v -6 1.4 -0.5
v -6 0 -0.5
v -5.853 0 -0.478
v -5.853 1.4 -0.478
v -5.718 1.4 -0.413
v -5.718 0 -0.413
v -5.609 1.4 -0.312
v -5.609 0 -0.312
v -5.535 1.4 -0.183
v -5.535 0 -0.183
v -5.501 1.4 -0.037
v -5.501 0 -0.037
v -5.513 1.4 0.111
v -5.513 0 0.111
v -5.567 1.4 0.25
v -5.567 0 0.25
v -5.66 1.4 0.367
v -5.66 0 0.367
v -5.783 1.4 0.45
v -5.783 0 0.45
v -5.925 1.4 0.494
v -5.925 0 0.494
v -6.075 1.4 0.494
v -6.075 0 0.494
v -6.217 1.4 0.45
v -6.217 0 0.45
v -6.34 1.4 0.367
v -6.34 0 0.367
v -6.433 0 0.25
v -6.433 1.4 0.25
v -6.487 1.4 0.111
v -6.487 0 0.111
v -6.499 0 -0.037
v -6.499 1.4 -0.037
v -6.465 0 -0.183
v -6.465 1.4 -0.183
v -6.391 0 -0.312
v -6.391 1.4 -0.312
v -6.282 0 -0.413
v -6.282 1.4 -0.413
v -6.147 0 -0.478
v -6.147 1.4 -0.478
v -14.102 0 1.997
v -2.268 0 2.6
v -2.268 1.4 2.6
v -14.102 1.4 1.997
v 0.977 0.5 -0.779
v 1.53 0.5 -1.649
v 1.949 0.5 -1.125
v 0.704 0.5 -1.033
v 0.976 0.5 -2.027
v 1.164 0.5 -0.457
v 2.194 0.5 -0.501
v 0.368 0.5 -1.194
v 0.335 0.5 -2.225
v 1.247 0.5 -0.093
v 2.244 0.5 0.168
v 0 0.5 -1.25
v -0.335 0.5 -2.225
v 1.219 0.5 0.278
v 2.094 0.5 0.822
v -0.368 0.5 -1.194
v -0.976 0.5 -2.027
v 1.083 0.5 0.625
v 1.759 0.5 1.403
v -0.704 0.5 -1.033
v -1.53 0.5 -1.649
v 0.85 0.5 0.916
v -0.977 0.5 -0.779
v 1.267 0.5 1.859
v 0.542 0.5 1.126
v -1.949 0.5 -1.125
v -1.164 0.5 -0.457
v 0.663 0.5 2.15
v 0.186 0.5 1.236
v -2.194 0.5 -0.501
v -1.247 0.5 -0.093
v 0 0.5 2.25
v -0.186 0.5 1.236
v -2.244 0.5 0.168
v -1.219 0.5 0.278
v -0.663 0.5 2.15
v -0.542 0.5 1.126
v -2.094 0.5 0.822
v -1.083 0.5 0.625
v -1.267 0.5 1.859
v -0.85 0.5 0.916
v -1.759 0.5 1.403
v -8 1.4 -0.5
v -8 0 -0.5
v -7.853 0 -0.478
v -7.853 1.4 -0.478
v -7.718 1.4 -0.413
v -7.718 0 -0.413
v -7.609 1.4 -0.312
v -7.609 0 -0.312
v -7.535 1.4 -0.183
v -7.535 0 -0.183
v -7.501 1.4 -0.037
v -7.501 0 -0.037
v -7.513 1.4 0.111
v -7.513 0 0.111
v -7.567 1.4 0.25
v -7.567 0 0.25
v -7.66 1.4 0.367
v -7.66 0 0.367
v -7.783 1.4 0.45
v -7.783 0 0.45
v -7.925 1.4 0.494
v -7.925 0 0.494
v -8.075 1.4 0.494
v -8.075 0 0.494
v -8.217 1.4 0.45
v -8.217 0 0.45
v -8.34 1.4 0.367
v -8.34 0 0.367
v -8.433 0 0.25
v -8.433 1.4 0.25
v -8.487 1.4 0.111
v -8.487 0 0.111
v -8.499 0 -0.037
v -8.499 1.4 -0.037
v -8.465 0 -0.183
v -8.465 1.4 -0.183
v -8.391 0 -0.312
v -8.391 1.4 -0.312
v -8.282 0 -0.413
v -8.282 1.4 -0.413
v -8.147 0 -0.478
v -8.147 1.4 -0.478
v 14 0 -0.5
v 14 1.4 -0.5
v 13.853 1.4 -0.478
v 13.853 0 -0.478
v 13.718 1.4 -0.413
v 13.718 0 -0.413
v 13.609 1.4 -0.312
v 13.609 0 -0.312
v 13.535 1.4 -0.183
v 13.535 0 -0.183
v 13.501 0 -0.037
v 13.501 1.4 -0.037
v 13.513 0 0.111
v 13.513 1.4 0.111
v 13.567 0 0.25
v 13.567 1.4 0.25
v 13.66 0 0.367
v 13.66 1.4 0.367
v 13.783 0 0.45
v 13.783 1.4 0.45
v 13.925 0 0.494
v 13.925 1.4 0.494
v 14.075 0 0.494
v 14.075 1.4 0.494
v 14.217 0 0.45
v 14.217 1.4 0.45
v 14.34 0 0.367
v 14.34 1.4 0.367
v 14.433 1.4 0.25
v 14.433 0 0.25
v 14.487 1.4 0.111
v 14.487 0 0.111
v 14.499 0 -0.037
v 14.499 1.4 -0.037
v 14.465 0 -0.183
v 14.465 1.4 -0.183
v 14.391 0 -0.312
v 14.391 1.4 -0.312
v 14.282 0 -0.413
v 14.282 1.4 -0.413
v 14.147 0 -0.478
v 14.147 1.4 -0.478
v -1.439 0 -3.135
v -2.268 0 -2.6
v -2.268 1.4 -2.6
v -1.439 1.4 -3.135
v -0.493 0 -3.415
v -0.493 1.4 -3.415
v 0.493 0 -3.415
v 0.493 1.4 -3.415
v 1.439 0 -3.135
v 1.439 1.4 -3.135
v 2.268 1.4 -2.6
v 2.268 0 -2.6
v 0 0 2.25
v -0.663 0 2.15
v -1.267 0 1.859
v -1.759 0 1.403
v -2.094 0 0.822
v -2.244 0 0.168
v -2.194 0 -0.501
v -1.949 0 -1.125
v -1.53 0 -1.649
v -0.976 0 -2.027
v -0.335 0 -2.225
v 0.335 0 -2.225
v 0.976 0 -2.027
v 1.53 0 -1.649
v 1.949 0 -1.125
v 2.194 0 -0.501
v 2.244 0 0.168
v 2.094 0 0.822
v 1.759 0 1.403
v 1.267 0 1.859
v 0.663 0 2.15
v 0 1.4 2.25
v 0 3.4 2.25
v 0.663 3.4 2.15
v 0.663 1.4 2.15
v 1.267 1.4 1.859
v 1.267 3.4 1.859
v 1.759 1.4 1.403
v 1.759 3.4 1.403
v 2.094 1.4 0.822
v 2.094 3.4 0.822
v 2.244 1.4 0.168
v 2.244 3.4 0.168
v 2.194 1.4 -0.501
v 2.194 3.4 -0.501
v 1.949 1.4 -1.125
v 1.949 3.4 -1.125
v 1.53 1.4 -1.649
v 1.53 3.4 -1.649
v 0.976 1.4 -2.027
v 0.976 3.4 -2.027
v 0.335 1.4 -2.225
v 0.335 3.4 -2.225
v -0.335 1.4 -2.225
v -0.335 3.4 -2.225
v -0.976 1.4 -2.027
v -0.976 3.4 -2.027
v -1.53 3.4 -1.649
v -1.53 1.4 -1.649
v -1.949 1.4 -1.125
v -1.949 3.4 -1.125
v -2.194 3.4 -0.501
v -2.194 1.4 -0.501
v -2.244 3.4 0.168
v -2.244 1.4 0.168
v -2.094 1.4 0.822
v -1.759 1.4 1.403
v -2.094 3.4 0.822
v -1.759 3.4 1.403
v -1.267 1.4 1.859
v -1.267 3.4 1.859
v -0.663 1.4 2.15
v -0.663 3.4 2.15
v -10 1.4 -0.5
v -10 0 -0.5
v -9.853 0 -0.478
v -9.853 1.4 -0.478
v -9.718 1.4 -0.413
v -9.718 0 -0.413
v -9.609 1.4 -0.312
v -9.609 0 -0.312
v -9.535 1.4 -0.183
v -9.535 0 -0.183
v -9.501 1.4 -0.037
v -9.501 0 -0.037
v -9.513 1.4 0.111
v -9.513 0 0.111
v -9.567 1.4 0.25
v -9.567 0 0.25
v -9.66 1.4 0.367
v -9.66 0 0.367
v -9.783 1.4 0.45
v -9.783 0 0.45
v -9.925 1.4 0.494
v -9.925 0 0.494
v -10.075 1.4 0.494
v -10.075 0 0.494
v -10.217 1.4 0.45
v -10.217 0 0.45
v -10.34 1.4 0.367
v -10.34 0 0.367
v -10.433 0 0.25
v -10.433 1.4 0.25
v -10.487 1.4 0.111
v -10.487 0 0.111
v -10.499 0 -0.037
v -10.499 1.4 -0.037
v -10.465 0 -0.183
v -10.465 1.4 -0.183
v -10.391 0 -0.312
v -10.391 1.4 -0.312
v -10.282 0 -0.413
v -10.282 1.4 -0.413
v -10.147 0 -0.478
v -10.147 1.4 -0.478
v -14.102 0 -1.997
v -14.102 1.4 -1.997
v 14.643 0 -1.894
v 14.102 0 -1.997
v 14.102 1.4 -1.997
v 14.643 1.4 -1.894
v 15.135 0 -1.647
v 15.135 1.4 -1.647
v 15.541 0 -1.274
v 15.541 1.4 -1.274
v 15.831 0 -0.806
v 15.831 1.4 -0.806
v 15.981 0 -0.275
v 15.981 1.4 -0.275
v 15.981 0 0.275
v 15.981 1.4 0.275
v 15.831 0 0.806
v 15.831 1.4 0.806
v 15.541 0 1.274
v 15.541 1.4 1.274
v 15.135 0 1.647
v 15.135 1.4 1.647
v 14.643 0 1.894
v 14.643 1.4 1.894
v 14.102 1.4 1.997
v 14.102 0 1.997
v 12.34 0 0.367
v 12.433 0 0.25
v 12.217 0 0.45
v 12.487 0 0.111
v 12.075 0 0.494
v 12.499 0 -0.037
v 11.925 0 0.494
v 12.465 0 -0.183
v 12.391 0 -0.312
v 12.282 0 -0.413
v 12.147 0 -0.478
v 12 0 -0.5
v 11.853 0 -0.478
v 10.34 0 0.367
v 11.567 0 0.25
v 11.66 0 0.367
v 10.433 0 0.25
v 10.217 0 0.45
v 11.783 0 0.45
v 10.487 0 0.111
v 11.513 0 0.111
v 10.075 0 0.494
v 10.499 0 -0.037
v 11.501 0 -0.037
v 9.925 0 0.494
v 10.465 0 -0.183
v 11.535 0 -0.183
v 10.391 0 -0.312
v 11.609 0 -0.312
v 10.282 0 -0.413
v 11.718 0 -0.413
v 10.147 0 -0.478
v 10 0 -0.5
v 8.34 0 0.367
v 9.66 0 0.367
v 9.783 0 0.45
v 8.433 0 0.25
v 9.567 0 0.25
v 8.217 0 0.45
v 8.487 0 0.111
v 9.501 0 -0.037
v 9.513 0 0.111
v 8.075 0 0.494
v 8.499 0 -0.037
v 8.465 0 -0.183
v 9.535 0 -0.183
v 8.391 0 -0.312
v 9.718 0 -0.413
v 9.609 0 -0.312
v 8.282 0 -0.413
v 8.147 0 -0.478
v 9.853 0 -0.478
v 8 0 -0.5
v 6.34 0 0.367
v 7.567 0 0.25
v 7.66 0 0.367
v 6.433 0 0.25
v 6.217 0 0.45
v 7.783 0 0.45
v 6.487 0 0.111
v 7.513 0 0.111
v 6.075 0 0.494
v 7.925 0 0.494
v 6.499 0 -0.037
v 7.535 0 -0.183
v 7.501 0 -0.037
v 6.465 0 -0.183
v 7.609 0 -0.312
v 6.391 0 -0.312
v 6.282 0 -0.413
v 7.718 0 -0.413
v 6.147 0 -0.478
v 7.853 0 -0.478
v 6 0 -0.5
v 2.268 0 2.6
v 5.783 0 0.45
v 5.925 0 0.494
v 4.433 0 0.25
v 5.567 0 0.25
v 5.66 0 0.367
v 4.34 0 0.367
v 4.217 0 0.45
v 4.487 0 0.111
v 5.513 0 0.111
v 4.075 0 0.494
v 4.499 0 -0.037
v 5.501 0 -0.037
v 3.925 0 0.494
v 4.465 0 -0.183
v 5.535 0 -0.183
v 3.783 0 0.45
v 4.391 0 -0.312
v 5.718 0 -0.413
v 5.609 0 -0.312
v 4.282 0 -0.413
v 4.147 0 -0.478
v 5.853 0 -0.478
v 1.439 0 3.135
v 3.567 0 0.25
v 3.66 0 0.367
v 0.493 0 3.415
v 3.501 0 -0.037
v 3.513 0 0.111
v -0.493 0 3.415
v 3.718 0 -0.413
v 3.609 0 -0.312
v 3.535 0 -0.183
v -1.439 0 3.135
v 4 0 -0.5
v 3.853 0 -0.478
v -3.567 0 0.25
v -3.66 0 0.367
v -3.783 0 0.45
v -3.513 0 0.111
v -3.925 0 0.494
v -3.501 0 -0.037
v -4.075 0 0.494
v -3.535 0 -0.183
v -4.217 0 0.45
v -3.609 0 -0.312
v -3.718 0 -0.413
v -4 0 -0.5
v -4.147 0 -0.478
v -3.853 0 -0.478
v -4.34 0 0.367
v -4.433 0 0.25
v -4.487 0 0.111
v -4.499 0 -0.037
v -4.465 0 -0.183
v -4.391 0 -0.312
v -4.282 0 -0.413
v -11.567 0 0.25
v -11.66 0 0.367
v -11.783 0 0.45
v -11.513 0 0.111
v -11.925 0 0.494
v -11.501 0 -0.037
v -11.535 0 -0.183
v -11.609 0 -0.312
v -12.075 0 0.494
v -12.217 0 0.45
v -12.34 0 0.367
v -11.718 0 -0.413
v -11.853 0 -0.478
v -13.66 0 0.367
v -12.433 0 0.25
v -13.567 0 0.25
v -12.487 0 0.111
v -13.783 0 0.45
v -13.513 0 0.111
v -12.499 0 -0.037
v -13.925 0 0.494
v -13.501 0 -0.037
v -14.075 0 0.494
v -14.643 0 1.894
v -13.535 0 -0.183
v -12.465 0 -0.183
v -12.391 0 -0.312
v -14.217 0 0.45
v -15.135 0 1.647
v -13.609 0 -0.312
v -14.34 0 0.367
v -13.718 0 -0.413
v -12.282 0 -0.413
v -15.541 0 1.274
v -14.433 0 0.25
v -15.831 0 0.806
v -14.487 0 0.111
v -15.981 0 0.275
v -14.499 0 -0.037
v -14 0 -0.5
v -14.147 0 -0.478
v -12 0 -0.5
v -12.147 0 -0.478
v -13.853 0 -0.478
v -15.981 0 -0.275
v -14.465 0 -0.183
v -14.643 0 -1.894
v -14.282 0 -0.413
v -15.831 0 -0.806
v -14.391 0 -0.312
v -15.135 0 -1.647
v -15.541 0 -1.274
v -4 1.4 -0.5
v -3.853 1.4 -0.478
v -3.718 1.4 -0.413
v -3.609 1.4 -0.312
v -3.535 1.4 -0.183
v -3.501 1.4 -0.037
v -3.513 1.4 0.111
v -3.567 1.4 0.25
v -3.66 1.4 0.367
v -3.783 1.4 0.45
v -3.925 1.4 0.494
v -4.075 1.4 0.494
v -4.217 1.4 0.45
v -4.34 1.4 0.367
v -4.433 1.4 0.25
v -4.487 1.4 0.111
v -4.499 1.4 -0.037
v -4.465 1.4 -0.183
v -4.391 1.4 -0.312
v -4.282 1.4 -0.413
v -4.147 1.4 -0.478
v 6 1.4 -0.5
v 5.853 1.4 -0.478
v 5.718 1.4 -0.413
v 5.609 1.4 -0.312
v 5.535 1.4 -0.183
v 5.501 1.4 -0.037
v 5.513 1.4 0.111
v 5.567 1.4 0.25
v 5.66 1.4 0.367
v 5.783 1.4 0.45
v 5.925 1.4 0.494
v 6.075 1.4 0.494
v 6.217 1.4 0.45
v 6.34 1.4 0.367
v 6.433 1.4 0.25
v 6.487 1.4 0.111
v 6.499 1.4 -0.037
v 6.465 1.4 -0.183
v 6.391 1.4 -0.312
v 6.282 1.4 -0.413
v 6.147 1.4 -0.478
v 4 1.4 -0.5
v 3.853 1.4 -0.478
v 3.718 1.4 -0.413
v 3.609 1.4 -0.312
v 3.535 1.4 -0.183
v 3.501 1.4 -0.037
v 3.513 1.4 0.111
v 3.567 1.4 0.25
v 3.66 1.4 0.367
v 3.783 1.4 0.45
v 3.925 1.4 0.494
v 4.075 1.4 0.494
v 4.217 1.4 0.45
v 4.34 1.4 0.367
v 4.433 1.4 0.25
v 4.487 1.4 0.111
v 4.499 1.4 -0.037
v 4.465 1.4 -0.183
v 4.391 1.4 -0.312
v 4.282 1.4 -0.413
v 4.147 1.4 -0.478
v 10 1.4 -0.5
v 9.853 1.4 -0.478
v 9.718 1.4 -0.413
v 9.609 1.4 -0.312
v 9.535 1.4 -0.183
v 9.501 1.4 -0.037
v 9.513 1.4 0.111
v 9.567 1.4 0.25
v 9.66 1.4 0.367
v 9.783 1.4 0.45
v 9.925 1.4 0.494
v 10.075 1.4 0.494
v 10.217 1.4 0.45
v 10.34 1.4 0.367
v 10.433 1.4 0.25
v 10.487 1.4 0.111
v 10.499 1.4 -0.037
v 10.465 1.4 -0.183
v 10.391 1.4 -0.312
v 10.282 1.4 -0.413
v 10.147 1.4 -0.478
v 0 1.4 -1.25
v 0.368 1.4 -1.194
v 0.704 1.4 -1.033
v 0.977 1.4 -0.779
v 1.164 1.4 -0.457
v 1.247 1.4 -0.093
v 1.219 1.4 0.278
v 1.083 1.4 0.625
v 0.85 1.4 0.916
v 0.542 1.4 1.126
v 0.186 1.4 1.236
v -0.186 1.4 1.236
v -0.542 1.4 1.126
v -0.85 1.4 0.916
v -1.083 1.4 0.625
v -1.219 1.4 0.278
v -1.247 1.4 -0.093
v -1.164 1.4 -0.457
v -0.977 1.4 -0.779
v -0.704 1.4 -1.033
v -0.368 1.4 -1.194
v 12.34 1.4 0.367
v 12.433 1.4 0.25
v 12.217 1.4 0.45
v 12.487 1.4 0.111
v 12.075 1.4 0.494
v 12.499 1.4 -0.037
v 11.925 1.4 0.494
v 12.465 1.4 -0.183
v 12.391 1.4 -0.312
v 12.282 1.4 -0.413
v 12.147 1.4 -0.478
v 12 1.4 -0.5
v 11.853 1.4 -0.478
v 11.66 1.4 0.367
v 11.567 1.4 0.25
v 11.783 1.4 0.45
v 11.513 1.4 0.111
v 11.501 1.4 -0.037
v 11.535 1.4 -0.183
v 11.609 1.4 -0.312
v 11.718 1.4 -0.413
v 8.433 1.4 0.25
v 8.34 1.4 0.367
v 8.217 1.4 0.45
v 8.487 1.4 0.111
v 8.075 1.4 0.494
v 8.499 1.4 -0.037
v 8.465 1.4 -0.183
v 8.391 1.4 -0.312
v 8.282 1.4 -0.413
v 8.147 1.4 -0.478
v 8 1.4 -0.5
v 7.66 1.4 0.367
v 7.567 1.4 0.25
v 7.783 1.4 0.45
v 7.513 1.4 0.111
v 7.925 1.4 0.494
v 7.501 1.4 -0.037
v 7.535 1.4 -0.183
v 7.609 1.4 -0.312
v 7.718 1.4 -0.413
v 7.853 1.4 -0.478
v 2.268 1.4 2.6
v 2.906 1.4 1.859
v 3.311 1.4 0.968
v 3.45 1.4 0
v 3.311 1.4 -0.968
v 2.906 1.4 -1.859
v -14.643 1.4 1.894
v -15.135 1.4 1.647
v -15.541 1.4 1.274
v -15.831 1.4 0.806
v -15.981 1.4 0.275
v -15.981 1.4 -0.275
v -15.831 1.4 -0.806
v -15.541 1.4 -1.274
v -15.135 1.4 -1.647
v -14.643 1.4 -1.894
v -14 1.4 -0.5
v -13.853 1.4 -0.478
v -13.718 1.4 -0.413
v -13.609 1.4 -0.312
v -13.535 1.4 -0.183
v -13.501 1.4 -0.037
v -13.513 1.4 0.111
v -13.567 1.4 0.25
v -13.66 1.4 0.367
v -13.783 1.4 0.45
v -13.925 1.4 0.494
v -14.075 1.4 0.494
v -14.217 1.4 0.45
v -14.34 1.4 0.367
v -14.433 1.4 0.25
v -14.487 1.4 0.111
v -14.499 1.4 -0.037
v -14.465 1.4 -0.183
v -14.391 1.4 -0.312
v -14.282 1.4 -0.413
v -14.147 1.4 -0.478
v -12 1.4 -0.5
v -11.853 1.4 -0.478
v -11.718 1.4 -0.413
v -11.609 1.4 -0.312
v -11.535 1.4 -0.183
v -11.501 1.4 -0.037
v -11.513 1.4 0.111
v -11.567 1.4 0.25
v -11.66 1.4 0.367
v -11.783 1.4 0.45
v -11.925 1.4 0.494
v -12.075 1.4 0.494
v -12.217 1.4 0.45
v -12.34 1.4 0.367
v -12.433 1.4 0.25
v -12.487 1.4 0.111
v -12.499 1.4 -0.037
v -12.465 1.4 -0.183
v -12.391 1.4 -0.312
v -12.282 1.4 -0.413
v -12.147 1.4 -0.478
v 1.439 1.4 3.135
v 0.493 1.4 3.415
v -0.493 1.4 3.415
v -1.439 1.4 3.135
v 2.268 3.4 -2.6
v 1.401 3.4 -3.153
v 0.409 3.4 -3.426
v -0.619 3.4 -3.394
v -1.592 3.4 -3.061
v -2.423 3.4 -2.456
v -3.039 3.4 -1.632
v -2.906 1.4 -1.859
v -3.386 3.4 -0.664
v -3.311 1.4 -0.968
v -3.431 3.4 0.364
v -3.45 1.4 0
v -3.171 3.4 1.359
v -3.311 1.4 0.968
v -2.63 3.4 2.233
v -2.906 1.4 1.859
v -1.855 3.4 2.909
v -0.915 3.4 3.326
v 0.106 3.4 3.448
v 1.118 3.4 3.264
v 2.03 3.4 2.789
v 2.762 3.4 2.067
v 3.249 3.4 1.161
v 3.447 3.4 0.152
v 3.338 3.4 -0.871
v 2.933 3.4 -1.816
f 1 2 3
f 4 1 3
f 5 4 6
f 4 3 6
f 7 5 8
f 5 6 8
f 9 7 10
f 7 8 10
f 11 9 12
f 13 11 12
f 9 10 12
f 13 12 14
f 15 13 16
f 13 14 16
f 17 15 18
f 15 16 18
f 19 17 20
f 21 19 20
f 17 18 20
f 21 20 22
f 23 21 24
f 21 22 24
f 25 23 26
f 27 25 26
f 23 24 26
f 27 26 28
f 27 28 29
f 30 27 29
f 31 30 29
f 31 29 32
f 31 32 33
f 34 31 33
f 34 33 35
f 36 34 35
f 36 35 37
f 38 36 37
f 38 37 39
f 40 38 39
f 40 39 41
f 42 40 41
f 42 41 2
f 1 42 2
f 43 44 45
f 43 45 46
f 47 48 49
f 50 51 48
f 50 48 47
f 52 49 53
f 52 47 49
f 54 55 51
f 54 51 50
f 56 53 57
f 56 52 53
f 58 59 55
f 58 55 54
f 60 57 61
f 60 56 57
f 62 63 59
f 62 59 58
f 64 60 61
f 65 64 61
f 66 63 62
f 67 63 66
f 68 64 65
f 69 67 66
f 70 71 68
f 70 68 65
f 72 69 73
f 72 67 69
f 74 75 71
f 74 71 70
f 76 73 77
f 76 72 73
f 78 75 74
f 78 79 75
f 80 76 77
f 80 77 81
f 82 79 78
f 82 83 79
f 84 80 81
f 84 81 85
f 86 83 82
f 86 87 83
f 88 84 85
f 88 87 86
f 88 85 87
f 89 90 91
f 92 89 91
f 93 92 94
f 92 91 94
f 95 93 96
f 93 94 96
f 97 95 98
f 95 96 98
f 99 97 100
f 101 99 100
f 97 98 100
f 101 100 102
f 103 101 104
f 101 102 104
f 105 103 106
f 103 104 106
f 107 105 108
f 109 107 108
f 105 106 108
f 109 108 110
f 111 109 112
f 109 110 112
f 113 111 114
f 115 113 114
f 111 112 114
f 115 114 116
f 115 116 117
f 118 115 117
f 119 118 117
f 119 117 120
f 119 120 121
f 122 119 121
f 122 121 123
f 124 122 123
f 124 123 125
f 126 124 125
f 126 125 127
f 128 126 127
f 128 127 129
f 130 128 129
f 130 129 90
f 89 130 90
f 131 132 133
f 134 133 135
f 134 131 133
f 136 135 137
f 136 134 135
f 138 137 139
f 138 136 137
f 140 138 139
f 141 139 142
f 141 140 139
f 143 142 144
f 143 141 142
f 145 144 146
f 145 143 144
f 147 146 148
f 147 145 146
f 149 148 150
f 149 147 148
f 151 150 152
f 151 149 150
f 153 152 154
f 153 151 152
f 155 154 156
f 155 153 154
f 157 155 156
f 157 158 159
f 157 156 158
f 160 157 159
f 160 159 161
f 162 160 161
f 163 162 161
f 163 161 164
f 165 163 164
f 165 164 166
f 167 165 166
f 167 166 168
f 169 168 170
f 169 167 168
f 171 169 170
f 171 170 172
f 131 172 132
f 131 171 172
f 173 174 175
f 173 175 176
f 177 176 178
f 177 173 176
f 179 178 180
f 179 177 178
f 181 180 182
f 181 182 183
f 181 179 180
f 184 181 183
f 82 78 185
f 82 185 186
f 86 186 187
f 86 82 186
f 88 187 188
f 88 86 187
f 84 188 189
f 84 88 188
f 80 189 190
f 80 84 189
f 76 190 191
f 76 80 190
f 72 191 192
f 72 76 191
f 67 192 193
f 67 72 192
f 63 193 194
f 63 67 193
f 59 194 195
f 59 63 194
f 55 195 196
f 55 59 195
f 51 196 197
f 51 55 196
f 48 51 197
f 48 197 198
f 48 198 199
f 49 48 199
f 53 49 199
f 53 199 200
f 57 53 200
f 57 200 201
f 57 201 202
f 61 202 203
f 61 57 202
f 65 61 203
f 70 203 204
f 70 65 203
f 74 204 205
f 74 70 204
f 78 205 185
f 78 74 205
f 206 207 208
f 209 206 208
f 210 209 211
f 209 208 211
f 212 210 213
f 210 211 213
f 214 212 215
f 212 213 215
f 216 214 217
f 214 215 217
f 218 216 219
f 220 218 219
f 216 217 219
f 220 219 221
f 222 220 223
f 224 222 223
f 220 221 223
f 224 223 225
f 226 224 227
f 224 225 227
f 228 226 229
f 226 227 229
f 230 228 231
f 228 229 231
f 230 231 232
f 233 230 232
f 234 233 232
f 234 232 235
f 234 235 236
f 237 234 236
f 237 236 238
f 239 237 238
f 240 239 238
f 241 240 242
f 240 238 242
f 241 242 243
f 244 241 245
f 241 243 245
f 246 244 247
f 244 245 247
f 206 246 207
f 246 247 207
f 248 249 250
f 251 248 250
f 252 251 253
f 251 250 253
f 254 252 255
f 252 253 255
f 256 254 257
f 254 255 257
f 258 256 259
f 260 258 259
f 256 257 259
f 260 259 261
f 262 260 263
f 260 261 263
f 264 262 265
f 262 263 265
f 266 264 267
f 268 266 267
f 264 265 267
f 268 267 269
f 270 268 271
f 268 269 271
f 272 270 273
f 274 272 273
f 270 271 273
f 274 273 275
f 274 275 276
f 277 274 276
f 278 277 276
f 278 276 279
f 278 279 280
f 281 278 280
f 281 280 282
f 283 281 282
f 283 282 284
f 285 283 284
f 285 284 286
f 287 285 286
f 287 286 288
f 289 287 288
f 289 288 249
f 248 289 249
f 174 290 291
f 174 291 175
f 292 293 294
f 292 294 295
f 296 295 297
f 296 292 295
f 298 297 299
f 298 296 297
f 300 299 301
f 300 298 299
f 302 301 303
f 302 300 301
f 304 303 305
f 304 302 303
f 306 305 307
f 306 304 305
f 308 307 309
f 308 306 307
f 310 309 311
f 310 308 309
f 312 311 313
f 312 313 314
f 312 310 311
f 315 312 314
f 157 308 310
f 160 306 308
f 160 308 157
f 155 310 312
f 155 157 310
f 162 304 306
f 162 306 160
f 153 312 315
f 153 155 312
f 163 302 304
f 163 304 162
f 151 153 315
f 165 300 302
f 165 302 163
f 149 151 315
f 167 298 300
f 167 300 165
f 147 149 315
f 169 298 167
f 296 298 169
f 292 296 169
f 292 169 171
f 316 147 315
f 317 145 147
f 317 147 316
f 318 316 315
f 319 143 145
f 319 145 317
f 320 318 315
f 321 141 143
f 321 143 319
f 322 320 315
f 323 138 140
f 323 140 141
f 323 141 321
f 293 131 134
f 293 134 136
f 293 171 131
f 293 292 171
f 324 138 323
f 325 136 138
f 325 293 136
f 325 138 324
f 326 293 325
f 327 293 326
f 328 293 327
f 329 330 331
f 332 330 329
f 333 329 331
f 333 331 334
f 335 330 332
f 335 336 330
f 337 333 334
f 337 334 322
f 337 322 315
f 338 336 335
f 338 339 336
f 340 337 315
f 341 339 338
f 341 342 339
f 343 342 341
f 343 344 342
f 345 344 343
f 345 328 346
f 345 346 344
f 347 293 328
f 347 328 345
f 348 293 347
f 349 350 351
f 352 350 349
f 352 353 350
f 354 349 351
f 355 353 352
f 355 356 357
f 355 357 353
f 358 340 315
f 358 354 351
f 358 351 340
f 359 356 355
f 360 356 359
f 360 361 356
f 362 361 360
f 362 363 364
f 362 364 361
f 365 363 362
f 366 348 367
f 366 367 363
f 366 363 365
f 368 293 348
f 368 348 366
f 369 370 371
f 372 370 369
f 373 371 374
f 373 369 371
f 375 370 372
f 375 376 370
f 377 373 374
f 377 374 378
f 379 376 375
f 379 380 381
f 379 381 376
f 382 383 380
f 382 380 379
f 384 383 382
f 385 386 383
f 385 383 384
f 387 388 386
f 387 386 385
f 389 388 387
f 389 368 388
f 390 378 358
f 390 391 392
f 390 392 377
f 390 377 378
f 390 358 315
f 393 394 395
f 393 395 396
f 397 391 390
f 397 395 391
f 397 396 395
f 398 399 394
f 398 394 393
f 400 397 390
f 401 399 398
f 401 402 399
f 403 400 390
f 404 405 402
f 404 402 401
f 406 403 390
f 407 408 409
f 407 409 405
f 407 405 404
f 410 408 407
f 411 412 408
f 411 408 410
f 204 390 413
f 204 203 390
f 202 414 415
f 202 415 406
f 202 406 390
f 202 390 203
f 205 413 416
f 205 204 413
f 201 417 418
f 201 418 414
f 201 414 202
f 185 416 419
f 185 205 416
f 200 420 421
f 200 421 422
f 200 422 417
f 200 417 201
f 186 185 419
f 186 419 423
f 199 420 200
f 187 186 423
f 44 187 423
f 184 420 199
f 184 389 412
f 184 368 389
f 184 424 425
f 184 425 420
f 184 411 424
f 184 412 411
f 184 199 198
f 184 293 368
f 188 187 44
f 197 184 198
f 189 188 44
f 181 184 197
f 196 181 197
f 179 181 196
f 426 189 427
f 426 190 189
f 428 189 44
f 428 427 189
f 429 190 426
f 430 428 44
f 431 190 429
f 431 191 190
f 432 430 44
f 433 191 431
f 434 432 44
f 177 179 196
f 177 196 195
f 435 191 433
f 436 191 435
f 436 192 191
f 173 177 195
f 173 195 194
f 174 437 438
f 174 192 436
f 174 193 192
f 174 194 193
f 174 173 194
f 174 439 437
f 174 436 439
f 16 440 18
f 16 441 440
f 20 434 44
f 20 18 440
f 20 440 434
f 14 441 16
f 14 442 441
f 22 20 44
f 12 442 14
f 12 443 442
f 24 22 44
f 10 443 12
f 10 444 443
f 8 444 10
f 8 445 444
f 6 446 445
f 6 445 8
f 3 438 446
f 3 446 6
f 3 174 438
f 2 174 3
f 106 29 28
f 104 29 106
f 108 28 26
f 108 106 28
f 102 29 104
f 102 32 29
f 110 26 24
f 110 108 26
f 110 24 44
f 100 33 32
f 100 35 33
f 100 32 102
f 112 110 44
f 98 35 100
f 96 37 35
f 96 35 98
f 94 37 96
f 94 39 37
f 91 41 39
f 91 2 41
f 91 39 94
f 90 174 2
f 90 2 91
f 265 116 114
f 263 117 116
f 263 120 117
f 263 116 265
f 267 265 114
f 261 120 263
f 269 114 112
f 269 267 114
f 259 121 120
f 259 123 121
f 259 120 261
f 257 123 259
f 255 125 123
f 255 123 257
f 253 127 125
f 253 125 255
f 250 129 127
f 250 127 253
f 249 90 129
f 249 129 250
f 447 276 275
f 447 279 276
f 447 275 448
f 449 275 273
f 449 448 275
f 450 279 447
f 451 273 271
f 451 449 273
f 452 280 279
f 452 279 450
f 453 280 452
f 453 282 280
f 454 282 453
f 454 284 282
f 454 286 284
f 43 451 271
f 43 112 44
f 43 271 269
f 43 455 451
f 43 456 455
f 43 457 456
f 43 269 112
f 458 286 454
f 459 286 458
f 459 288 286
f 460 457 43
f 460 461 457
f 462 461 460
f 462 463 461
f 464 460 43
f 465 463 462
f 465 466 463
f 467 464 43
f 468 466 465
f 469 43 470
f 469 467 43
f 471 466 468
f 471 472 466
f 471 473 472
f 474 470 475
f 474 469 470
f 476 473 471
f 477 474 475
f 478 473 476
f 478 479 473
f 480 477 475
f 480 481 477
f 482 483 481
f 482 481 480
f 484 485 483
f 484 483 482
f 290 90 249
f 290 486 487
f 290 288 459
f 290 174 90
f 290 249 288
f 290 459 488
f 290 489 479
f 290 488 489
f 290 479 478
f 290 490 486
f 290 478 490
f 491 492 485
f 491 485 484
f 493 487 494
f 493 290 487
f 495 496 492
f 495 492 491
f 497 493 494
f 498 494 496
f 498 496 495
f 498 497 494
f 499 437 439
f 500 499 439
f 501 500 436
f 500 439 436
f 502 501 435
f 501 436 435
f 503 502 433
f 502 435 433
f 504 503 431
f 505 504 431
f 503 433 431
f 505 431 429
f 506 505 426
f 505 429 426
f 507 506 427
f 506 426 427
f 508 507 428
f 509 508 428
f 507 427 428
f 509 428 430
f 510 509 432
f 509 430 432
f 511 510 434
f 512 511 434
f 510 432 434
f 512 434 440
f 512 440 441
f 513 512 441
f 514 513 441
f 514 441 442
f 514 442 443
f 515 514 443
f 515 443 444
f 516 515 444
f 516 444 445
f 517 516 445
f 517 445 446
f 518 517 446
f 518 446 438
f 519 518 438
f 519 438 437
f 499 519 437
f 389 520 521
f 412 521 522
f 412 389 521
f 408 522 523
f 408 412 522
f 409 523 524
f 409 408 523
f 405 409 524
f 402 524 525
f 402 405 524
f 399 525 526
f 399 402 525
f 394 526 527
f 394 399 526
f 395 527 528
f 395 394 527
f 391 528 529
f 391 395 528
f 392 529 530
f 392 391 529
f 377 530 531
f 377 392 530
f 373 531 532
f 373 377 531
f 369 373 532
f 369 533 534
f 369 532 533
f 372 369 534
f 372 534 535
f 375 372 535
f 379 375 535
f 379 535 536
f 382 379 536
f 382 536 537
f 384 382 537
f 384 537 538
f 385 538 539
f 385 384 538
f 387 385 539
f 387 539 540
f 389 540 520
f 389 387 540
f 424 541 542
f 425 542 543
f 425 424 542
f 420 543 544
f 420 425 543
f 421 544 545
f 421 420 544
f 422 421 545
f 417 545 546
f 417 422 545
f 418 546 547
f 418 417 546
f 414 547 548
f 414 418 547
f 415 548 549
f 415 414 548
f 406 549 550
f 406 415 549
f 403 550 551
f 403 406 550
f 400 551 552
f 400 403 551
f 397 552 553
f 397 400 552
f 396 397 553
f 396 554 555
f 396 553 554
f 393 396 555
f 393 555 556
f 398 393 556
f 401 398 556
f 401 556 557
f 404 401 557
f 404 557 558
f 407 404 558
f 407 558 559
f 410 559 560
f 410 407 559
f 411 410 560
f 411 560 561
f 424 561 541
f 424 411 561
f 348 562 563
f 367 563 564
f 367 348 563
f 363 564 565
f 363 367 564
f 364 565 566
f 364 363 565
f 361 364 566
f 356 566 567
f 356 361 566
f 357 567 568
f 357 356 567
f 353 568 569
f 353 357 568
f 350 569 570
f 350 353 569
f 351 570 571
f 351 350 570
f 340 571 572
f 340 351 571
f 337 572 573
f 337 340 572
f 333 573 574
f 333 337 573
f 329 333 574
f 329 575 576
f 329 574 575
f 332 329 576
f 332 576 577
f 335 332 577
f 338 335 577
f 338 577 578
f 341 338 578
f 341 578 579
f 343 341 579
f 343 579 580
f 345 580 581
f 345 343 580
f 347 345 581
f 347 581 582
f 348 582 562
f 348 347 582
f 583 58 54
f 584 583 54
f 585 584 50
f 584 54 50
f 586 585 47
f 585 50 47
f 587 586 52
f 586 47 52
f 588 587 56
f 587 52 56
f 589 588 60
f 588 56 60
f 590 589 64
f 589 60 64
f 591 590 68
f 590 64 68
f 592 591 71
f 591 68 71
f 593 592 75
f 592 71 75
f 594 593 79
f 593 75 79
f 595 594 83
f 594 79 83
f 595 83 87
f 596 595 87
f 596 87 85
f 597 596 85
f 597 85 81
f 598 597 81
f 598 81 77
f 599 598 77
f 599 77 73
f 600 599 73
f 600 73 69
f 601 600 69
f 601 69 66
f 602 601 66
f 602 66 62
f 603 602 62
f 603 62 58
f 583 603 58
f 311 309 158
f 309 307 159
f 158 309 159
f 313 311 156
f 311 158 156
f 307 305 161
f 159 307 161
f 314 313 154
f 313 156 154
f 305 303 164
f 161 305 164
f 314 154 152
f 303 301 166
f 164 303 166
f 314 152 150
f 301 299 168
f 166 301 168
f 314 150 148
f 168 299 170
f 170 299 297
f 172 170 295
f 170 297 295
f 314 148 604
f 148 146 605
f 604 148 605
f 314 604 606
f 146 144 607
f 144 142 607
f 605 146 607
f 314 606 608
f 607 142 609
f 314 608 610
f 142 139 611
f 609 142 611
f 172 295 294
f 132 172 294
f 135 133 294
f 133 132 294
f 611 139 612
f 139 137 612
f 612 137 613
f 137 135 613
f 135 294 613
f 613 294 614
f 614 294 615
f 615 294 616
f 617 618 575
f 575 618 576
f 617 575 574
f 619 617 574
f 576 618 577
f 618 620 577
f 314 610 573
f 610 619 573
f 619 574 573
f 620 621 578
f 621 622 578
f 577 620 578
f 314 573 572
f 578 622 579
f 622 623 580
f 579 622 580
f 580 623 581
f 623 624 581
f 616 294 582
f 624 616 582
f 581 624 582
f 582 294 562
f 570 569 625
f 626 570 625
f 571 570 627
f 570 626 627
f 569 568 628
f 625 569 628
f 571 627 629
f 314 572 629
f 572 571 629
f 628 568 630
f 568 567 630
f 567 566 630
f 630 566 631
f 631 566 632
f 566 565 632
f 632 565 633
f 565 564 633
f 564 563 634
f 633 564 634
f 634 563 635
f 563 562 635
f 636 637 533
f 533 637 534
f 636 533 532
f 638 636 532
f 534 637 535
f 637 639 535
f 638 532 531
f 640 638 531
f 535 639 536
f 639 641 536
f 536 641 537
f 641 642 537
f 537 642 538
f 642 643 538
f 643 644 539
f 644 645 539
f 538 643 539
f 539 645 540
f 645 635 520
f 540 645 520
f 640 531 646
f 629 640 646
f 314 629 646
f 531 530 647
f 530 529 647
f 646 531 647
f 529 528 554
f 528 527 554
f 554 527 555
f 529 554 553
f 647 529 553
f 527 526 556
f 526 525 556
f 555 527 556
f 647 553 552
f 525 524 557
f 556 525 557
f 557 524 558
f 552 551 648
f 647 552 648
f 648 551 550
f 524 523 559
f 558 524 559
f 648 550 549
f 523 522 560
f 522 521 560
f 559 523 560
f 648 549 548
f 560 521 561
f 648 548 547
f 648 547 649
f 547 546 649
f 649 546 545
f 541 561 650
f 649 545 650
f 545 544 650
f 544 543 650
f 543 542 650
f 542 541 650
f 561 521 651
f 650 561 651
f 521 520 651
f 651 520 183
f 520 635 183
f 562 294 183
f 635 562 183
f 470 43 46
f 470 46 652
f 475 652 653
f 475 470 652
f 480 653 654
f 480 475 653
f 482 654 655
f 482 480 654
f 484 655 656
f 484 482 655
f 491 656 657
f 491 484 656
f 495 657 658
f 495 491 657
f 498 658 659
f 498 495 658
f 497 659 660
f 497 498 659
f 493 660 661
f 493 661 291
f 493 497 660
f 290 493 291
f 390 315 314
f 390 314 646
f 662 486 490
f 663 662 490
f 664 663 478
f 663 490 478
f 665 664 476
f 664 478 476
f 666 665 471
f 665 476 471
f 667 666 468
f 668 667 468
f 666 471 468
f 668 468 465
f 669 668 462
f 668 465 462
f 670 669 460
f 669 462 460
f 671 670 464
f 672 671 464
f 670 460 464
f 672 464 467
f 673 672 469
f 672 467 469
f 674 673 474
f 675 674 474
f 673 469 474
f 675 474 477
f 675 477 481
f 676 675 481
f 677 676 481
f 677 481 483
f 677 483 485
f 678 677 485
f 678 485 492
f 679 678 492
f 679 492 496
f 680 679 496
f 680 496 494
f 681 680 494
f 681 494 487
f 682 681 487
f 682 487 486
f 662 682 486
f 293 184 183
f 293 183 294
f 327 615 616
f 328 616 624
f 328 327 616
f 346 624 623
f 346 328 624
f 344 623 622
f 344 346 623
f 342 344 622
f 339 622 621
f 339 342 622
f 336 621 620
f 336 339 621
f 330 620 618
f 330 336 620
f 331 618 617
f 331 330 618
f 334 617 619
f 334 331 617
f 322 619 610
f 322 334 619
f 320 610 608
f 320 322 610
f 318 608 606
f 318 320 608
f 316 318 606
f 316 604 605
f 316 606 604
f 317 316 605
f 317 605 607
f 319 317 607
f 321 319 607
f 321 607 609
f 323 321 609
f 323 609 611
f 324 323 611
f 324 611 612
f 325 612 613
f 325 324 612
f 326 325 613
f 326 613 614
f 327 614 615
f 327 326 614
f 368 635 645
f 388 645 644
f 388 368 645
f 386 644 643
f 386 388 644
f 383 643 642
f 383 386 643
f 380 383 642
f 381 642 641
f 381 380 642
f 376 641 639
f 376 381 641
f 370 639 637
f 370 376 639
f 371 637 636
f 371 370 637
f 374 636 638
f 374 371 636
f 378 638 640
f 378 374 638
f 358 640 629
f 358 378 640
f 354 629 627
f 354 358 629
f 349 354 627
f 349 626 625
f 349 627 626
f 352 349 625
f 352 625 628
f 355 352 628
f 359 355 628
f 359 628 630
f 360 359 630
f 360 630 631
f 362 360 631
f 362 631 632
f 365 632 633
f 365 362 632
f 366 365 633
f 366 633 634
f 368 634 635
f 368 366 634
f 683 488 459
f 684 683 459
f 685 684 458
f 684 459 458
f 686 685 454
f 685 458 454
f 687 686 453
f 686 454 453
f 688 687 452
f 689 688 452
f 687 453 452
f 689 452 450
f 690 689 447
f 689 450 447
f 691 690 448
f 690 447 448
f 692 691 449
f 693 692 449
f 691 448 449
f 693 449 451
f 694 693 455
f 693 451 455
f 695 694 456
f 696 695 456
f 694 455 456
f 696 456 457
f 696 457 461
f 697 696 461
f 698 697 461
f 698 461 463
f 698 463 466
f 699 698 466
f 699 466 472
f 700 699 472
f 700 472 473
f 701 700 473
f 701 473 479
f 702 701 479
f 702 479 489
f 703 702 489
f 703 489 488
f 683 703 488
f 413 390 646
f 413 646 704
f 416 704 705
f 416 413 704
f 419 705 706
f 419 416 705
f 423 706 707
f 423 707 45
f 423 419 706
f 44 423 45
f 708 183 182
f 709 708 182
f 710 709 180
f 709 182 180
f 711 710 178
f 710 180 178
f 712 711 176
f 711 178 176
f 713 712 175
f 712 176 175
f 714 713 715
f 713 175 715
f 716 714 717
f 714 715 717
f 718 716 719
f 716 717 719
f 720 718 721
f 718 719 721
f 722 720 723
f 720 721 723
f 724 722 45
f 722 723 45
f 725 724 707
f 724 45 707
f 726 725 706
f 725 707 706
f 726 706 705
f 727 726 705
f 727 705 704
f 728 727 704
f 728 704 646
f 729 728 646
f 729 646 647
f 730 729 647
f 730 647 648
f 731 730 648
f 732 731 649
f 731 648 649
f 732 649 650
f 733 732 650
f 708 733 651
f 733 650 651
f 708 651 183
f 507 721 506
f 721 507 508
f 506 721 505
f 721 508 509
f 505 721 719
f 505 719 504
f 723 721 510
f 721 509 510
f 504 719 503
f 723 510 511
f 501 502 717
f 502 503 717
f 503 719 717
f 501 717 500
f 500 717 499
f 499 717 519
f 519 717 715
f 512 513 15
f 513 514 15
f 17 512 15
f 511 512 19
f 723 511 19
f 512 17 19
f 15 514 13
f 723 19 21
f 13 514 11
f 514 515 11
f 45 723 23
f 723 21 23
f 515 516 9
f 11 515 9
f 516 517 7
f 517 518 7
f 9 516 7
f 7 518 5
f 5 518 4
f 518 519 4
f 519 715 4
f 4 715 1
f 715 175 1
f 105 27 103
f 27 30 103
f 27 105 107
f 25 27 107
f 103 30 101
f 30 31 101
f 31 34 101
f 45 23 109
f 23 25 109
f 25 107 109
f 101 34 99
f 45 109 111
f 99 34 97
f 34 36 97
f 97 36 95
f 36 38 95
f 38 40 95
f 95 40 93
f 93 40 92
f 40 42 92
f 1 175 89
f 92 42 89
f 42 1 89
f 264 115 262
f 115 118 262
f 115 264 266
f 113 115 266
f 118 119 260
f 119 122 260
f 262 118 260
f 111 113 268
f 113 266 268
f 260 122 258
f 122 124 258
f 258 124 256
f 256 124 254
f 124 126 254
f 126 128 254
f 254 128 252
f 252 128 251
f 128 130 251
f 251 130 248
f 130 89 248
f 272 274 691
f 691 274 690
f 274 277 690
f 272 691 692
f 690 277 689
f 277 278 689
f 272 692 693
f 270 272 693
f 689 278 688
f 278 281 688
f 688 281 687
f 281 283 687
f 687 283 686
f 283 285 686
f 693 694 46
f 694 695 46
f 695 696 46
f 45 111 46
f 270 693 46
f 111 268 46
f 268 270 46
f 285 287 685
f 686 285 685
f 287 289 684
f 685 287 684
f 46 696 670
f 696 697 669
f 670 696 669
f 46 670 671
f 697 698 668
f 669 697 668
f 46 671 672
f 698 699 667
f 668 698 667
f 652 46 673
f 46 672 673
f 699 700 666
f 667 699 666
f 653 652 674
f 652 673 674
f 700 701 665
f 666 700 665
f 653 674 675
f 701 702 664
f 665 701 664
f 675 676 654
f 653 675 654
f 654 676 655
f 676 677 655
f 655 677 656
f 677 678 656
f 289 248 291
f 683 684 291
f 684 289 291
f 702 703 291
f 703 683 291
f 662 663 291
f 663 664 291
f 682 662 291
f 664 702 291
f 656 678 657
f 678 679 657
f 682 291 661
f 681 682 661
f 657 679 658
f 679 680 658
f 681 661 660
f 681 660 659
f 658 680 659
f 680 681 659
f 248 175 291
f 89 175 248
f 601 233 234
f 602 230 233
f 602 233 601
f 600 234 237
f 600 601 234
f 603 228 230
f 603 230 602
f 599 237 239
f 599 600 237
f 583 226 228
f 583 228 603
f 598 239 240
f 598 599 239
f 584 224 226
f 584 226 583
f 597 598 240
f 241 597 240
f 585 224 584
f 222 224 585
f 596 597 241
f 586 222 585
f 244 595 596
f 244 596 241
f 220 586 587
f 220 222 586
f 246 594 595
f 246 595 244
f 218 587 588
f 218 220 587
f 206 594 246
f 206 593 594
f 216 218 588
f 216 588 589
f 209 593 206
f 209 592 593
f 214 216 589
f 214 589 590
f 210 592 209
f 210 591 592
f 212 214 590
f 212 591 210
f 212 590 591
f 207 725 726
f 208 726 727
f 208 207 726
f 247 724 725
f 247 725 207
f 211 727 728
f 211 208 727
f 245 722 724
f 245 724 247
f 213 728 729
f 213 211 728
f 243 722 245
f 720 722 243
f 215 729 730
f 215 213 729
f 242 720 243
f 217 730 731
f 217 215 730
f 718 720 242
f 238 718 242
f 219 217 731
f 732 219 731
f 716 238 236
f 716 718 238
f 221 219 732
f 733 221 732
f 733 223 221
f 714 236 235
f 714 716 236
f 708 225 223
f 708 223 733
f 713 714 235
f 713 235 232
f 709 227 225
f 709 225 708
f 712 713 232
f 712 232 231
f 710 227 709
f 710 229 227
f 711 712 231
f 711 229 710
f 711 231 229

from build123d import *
from build123d.topology import SkipClean

# Parameters (mm, degrees)
RESSALTO_EXTRUS_O1_DEPTH = 1.4
ESBO_O2_R                = 3.45
RESSALTO_EXTRUS_O2_DEPTH = 2
ESBO_O3_R                = 2.25
CORTE_EXTRUS_O1_DEPTH    = 2
CORTE_EXTRUS_O2_START    = -0.5
ESBO_O4_R                = 2.25
CORTE_EXTRUS_O2_DEPTH    = 0.5
ESBO_O5_R                = 1.25
CORTE_EXTRUS_O3_DEPTH    = 17.62265021
ESBO_O6_R                = 0.5
CORTE_EXTRUS_O4_DEPTH    = 17.717131931


with BuildPart() as part:
    # Esboço1 → Ressalto-extrusão1 (new body)
    with BuildSketch(Plane(origin=(0, 0, 0), x_dir=(1, 0, 0), z_dir=(0, 1, 0))):
        with BuildLine():
            Line((-14.101708317, 1.99741218), (-2.267708094, 2.6))
            ThreePointArc((-2.267708094, 2.6), (0, 3.45), (2.267708094, 2.6))
            Line((2.267708094, 2.6), (14.101708317, 1.99741218))
            ThreePointArc((14.101708317, 1.99741218), (16, 0), (14.101708317, -1.99741218))
            Line((14.101708317, -1.99741218), (2.267708094, -2.6))
            ThreePointArc((2.267708094, -2.6), (0, -3.45), (-2.267708094, -2.6))
            Line((-2.267708094, -2.6), (-14.101708317, -1.99741218))
            ThreePointArc((-14.101708317, -1.99741218), (-16, 0), (-14.101708317, 1.99741218))
        make_face()
    extrude(amount=RESSALTO_EXTRUS_O1_DEPTH)

    # Esboço2 → Ressalto-extrusão2 (add)
    with SkipClean():  # the faces are left unmerged after this step: merging them gives an invalid solid
        with BuildSketch(Plane(origin=(0, 1.4, 0), x_dir=(1, 0, 0), z_dir=(0, 1, 0))):
            with Locations(Location((0, 0, 0), (0, 0, 48.905212005))):
                Circle(ESBO_O2_R)
        extrude(amount=RESSALTO_EXTRUS_O2_DEPTH)

    # Esboço3 → Corte-extrusão1 (cut)
    with SkipClean():  # the faces are left unmerged after this step: merging them gives an invalid solid
        with BuildSketch(Plane(origin=(0, 3.4, 0), x_dir=(1, 0, 0), z_dir=(0, 1, 0))):
            with Locations(Location((0, 0, 0), (0, 0, 270))):
                Circle(ESBO_O3_R)
        extrude(amount=-CORTE_EXTRUS_O1_DEPTH, mode=Mode.SUBTRACT)

    # Esboço4 → Corte-extrusão2 (cut)
    with SkipClean():  # the faces are left unmerged after this step: merging them gives an invalid solid
        with BuildSketch(Plane.XZ.offset(CORTE_EXTRUS_O2_START)):
            with Locations(Location((0, 0, 0), (0, 0, 90))):
                Circle(ESBO_O4_R)
        extrude(amount=CORTE_EXTRUS_O2_DEPTH, mode=Mode.SUBTRACT)

    # Esboço5 → Corte-extrusão3 (cut, through all)
    with SkipClean():  # the faces are left unmerged after this step: merging them gives an invalid solid
        with BuildSketch(Plane.XZ.offset(-0.5)):
            with Locations(Location((0, 0, 0), (0, 0, 270))):
                Circle(ESBO_O5_R)
        extrude(amount=-CORTE_EXTRUS_O3_DEPTH, mode=Mode.SUBTRACT)

    # Esboço6 → Corte-extrusão4 (cut, through all)
    with SkipClean():  # the faces are left unmerged after this step: merging them gives an invalid solid
        with BuildSketch(Plane.XZ):
            with Locations(Location((-4, 0, 0), (0, 0, 270))):
                Circle(ESBO_O6_R)
            with Locations(Location((-6, 0, 0), (0, 0, 270))):
                Circle(ESBO_O6_R)
            with Locations(Location((-8, 0, 0), (0, 0, 270))):
                Circle(ESBO_O6_R)
            with Locations(Location((-10, 0, 0), (0, 0, 270))):
                Circle(ESBO_O6_R)
            with Locations(Location((-12, 0, 0), (0, 0, 270))):
                Circle(ESBO_O6_R)
            with Locations(Location((-14, 0, 0), (0, 0, 270))):
                Circle(ESBO_O6_R)
        corte_extrus_o4 = extrude(amount=-CORTE_EXTRUS_O4_DEPTH, mode=Mode.SUBTRACT)

    # Espelhar1: Corte-extrusão4 across plane
    with SkipClean():  # the faces are left unmerged after this step: merging them gives an invalid solid
        add(corte_extrus_o4.mirror(Plane(origin=(0, 0, 0), x_dir=(0, 0, 1), z_dir=(1, 0, 0))), mode=Mode.SUBTRACT)


solid = part.part
